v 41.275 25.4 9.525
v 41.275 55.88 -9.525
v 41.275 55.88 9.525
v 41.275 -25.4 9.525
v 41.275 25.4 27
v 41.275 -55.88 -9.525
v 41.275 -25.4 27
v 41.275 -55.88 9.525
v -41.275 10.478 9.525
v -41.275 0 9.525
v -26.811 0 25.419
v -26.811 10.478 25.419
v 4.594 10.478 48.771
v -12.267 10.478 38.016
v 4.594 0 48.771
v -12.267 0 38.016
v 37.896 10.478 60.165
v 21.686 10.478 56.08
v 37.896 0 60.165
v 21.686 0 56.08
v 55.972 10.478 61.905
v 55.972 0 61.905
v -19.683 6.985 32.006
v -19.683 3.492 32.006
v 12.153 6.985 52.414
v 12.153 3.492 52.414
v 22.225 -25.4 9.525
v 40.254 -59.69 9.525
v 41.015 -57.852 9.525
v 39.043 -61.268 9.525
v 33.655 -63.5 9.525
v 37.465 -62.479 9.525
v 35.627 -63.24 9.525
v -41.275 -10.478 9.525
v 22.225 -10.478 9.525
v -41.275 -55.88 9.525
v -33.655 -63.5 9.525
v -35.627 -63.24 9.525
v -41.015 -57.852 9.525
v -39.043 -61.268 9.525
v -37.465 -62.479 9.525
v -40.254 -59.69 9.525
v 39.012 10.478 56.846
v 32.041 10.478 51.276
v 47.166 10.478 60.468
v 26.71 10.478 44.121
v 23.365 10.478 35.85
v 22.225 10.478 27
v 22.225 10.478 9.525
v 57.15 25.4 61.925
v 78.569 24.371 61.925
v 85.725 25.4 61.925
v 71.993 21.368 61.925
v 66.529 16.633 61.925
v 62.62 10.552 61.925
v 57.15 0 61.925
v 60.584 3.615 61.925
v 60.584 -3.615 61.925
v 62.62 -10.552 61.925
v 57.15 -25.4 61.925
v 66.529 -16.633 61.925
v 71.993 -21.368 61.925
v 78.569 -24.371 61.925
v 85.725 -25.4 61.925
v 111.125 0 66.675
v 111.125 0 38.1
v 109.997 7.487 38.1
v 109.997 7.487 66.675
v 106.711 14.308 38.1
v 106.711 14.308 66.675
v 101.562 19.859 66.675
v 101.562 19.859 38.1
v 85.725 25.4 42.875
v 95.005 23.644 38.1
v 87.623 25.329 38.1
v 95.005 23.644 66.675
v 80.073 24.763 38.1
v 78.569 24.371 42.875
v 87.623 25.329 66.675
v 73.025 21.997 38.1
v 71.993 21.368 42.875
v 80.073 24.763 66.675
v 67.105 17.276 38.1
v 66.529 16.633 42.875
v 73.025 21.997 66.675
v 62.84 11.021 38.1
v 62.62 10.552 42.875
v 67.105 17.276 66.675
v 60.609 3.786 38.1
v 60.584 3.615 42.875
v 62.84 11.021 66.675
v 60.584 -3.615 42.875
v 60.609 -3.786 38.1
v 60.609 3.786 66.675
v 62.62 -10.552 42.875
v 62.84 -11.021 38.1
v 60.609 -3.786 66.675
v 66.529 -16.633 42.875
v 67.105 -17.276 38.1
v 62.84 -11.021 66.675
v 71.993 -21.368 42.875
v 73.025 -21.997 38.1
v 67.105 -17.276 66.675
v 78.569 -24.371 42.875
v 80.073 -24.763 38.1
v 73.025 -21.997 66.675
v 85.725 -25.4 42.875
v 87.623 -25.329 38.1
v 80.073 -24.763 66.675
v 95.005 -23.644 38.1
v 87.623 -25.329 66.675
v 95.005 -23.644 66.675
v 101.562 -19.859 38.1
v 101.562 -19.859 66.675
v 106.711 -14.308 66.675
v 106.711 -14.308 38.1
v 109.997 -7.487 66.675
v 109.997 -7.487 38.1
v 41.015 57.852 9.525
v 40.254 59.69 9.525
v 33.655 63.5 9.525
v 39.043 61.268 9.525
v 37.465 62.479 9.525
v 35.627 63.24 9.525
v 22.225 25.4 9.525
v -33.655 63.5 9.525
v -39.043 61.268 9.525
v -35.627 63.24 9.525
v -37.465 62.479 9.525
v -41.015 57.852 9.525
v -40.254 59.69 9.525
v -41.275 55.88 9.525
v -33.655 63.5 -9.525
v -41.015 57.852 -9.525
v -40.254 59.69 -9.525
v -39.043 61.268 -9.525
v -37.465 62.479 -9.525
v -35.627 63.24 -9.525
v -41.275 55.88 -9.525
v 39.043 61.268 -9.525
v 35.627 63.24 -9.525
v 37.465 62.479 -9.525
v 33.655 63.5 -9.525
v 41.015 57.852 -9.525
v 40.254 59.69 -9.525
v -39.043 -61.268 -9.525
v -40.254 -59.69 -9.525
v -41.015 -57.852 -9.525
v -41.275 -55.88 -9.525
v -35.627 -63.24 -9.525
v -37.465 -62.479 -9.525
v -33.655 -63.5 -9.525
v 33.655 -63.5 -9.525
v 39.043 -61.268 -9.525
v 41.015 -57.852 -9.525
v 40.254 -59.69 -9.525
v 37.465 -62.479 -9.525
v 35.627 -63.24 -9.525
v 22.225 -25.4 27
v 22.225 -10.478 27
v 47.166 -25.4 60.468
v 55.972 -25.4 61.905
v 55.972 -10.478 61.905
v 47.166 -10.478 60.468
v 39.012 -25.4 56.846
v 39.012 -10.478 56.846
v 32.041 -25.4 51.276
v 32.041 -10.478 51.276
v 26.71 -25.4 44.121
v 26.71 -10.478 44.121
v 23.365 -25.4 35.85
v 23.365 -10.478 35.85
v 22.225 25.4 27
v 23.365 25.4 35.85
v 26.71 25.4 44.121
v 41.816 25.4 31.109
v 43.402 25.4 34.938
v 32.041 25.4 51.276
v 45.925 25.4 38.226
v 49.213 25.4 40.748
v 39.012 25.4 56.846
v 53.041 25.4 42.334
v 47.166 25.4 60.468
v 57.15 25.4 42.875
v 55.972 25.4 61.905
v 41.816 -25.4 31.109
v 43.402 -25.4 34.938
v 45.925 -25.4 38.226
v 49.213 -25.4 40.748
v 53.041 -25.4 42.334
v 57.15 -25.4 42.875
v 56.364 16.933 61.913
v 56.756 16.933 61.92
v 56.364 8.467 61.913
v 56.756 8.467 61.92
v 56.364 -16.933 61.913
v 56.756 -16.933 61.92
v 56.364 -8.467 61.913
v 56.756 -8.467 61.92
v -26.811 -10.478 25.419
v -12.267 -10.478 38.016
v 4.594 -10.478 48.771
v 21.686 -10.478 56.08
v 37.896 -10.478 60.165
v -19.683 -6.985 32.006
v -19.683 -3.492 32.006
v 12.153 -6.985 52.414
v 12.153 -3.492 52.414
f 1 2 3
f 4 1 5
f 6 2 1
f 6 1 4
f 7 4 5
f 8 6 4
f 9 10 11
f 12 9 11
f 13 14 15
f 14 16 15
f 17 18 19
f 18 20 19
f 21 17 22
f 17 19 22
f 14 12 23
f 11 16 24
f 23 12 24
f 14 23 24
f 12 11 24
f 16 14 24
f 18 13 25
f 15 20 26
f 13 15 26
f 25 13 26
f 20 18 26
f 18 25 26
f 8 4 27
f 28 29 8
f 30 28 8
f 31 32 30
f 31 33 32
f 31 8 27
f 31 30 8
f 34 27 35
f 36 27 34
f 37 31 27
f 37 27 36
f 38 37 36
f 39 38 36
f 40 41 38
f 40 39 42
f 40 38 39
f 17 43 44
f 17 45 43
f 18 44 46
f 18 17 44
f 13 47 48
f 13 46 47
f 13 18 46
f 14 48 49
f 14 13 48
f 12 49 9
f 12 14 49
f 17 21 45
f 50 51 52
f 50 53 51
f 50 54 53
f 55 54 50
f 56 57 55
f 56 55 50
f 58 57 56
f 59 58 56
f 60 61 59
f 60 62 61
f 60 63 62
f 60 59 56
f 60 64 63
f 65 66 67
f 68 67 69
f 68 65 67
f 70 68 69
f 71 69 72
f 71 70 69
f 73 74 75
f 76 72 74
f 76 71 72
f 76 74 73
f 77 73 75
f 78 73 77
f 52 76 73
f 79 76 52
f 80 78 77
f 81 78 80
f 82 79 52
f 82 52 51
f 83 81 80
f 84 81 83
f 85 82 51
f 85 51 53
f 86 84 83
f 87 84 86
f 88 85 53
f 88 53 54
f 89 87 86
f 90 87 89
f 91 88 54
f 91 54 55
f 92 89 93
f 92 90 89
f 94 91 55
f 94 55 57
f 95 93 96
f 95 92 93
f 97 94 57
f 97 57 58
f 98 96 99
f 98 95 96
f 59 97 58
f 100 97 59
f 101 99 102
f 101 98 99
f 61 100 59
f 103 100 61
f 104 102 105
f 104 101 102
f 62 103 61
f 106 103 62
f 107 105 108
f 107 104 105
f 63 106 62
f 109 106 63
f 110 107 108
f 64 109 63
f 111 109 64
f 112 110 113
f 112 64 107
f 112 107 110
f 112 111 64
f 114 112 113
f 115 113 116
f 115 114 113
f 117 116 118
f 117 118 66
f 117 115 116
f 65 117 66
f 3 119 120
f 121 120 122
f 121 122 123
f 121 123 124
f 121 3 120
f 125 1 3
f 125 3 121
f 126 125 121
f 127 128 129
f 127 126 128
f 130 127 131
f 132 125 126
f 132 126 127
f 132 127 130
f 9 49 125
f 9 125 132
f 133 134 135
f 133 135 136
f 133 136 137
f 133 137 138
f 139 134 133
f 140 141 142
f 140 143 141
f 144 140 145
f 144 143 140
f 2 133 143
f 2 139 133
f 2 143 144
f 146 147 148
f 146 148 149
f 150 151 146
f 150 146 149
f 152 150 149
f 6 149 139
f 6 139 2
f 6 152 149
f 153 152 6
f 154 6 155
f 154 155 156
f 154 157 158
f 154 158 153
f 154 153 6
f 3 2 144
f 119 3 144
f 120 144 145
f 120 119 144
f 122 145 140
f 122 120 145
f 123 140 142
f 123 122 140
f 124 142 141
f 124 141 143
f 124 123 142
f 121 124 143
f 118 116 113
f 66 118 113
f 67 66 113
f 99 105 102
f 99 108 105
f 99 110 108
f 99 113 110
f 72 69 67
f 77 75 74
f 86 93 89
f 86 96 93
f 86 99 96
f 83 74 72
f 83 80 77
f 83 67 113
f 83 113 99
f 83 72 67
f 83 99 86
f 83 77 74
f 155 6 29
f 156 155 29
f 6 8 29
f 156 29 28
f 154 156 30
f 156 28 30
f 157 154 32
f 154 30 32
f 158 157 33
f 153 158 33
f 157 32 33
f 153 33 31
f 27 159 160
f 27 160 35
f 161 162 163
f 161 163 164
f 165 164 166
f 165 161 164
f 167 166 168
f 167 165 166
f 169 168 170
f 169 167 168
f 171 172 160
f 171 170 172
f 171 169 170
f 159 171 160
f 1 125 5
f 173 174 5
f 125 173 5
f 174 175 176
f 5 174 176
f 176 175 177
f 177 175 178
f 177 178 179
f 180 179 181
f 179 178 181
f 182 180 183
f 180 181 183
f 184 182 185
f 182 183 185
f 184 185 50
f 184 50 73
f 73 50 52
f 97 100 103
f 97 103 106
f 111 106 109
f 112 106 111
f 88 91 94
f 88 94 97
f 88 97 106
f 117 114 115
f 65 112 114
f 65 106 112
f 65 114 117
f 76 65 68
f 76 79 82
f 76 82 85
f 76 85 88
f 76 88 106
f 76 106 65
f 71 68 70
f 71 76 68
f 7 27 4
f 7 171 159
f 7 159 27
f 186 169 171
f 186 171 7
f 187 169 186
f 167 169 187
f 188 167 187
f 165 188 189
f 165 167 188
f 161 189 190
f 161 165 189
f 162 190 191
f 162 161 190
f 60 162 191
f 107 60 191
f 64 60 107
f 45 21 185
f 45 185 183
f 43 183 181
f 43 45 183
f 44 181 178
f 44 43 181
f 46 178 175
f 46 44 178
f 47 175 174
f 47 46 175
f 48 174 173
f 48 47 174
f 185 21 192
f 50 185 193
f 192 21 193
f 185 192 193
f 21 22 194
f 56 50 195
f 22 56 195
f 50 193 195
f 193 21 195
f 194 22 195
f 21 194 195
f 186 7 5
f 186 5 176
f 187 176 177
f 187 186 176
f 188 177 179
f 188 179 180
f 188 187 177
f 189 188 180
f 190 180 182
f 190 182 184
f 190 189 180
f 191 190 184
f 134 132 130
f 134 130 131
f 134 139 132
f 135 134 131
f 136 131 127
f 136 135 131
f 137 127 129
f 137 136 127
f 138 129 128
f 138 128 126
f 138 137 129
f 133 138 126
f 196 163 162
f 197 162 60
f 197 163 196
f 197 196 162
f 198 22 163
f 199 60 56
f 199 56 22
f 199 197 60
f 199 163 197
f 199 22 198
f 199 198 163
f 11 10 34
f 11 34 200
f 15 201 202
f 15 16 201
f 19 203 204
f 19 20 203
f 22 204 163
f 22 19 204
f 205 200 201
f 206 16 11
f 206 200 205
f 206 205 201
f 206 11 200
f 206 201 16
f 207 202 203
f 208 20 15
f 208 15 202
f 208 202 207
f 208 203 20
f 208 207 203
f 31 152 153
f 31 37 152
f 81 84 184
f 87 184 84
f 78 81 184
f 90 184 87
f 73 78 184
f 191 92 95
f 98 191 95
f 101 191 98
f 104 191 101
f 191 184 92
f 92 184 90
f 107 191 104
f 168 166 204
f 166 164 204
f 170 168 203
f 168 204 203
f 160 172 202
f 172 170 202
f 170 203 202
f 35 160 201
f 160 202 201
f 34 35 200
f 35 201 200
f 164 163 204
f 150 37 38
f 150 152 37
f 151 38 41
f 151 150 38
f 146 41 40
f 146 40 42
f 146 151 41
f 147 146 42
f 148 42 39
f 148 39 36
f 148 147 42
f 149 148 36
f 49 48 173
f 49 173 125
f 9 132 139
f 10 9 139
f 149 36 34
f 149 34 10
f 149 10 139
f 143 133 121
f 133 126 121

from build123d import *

# Parameters (mm, degrees)
F1_DEPTH = 63.5
F2_DEPTH = 10.4775
F0_W     = 25.4
F0_H     = 19.05
F3_DEPTH = 25.4
F5_R     = 7.62


with BuildPart() as f1:
    # F0 (on Front) → F1 (new body, symmetric)
    with BuildSketch(Plane.XZ):
        Polygon((-41.275, -9.525), (41.275, -9.525), (41.275, 9.525), (22.225, 9.525), (-41.275, 9.525), align=None)
    extrude(amount=F1_DEPTH, both=True)

    # F0 (on Front) → F2 (join, symmetric)
    with BuildSketch(Plane.XZ):
        with BuildLine():
            add(Edge.make_bspline(
                [(-41.275, 9.525), (-24.2267409632, 30.0944438393), (5.5825358431, 60.821203998), (55.971666309, 61.9053164547)],
                knots=[0, 0, 0, 0, 110.6448027751, 110.6448027751, 110.6448027751, 110.6448027751], degree=3))
            Line((-41.275, 9.525), (22.225, 9.525))
            Line((22.225, 9.525), (22.225, 27.0002))
            ThreePointArc((22.225, 27.0002), (32.041147685, 51.2757259556), (55.971666309, 61.9053164547))
        make_face()
    extrude(amount=F2_DEPTH, both=True)

    # F0 (on Front) → F3 (join, symmetric)
    with BuildSketch(Plane.XZ):
        with BuildLine():
            Line((22.225, 9.525), (41.275, 9.525))
            Line((41.275, 9.525), (41.275, 27.0002))
            ThreePointArc((41.275, 27.0002), (45.9246798487, 38.2255201513), (57.15, 42.8752))
            Line((57.15, 42.8752), (60.325, 42.8752))
            Line((60.325, 42.8752), (60.325, 61.9252))
            Line((60.325, 61.9252), (57.15, 61.9252))
            add(Edge.make_bspline(
                [(55.971666309, 61.9053164547), (56.3632004506, 61.9137402364), (56.7559771249, 61.9203743088), (57.15, 61.9252)],
                knots=[110.6448027751, 110.6448027751, 110.6448027751, 110.6448027751, 111.5045361635, 111.5045361635, 111.5045361635, 111.5045361635], degree=3))
            ThreePointArc((55.971666309, 61.9053164547), (32.041147685, 51.2757259556), (22.225, 27.0002))
            Line((22.225, 27.0002), (22.225, 9.525))
        make_face()
        with Locations((73.025, 52.4002)):
            Rectangle(F0_W, F0_H)
    extrude(amount=F3_DEPTH, both=True)

    # F0 (on Front) → F4 (revolve)
    with BuildSketch(Plane.XZ):
        Polygon((85.725, 61.9252), (85.725, 42.8752), (85.725, 38.1), (111.125, 38.1), (111.125, 66.675), (85.725, 66.675), align=None)
    revolve(axis=Axis((85.725, 0, 52.3875), (0, 0, 1)))

    # F5
    f5_edges = [f1.edges().sort_by_distance(p)[0] for p in [
        (41.275, -63.5, 0),
        (-41.275, -63.5, 0),
        (41.275, 63.5, 0),
        (-41.275, 63.5, 0),
    ]]
    fillet(f5_edges, radius=F5_R)


solid = f1.part
